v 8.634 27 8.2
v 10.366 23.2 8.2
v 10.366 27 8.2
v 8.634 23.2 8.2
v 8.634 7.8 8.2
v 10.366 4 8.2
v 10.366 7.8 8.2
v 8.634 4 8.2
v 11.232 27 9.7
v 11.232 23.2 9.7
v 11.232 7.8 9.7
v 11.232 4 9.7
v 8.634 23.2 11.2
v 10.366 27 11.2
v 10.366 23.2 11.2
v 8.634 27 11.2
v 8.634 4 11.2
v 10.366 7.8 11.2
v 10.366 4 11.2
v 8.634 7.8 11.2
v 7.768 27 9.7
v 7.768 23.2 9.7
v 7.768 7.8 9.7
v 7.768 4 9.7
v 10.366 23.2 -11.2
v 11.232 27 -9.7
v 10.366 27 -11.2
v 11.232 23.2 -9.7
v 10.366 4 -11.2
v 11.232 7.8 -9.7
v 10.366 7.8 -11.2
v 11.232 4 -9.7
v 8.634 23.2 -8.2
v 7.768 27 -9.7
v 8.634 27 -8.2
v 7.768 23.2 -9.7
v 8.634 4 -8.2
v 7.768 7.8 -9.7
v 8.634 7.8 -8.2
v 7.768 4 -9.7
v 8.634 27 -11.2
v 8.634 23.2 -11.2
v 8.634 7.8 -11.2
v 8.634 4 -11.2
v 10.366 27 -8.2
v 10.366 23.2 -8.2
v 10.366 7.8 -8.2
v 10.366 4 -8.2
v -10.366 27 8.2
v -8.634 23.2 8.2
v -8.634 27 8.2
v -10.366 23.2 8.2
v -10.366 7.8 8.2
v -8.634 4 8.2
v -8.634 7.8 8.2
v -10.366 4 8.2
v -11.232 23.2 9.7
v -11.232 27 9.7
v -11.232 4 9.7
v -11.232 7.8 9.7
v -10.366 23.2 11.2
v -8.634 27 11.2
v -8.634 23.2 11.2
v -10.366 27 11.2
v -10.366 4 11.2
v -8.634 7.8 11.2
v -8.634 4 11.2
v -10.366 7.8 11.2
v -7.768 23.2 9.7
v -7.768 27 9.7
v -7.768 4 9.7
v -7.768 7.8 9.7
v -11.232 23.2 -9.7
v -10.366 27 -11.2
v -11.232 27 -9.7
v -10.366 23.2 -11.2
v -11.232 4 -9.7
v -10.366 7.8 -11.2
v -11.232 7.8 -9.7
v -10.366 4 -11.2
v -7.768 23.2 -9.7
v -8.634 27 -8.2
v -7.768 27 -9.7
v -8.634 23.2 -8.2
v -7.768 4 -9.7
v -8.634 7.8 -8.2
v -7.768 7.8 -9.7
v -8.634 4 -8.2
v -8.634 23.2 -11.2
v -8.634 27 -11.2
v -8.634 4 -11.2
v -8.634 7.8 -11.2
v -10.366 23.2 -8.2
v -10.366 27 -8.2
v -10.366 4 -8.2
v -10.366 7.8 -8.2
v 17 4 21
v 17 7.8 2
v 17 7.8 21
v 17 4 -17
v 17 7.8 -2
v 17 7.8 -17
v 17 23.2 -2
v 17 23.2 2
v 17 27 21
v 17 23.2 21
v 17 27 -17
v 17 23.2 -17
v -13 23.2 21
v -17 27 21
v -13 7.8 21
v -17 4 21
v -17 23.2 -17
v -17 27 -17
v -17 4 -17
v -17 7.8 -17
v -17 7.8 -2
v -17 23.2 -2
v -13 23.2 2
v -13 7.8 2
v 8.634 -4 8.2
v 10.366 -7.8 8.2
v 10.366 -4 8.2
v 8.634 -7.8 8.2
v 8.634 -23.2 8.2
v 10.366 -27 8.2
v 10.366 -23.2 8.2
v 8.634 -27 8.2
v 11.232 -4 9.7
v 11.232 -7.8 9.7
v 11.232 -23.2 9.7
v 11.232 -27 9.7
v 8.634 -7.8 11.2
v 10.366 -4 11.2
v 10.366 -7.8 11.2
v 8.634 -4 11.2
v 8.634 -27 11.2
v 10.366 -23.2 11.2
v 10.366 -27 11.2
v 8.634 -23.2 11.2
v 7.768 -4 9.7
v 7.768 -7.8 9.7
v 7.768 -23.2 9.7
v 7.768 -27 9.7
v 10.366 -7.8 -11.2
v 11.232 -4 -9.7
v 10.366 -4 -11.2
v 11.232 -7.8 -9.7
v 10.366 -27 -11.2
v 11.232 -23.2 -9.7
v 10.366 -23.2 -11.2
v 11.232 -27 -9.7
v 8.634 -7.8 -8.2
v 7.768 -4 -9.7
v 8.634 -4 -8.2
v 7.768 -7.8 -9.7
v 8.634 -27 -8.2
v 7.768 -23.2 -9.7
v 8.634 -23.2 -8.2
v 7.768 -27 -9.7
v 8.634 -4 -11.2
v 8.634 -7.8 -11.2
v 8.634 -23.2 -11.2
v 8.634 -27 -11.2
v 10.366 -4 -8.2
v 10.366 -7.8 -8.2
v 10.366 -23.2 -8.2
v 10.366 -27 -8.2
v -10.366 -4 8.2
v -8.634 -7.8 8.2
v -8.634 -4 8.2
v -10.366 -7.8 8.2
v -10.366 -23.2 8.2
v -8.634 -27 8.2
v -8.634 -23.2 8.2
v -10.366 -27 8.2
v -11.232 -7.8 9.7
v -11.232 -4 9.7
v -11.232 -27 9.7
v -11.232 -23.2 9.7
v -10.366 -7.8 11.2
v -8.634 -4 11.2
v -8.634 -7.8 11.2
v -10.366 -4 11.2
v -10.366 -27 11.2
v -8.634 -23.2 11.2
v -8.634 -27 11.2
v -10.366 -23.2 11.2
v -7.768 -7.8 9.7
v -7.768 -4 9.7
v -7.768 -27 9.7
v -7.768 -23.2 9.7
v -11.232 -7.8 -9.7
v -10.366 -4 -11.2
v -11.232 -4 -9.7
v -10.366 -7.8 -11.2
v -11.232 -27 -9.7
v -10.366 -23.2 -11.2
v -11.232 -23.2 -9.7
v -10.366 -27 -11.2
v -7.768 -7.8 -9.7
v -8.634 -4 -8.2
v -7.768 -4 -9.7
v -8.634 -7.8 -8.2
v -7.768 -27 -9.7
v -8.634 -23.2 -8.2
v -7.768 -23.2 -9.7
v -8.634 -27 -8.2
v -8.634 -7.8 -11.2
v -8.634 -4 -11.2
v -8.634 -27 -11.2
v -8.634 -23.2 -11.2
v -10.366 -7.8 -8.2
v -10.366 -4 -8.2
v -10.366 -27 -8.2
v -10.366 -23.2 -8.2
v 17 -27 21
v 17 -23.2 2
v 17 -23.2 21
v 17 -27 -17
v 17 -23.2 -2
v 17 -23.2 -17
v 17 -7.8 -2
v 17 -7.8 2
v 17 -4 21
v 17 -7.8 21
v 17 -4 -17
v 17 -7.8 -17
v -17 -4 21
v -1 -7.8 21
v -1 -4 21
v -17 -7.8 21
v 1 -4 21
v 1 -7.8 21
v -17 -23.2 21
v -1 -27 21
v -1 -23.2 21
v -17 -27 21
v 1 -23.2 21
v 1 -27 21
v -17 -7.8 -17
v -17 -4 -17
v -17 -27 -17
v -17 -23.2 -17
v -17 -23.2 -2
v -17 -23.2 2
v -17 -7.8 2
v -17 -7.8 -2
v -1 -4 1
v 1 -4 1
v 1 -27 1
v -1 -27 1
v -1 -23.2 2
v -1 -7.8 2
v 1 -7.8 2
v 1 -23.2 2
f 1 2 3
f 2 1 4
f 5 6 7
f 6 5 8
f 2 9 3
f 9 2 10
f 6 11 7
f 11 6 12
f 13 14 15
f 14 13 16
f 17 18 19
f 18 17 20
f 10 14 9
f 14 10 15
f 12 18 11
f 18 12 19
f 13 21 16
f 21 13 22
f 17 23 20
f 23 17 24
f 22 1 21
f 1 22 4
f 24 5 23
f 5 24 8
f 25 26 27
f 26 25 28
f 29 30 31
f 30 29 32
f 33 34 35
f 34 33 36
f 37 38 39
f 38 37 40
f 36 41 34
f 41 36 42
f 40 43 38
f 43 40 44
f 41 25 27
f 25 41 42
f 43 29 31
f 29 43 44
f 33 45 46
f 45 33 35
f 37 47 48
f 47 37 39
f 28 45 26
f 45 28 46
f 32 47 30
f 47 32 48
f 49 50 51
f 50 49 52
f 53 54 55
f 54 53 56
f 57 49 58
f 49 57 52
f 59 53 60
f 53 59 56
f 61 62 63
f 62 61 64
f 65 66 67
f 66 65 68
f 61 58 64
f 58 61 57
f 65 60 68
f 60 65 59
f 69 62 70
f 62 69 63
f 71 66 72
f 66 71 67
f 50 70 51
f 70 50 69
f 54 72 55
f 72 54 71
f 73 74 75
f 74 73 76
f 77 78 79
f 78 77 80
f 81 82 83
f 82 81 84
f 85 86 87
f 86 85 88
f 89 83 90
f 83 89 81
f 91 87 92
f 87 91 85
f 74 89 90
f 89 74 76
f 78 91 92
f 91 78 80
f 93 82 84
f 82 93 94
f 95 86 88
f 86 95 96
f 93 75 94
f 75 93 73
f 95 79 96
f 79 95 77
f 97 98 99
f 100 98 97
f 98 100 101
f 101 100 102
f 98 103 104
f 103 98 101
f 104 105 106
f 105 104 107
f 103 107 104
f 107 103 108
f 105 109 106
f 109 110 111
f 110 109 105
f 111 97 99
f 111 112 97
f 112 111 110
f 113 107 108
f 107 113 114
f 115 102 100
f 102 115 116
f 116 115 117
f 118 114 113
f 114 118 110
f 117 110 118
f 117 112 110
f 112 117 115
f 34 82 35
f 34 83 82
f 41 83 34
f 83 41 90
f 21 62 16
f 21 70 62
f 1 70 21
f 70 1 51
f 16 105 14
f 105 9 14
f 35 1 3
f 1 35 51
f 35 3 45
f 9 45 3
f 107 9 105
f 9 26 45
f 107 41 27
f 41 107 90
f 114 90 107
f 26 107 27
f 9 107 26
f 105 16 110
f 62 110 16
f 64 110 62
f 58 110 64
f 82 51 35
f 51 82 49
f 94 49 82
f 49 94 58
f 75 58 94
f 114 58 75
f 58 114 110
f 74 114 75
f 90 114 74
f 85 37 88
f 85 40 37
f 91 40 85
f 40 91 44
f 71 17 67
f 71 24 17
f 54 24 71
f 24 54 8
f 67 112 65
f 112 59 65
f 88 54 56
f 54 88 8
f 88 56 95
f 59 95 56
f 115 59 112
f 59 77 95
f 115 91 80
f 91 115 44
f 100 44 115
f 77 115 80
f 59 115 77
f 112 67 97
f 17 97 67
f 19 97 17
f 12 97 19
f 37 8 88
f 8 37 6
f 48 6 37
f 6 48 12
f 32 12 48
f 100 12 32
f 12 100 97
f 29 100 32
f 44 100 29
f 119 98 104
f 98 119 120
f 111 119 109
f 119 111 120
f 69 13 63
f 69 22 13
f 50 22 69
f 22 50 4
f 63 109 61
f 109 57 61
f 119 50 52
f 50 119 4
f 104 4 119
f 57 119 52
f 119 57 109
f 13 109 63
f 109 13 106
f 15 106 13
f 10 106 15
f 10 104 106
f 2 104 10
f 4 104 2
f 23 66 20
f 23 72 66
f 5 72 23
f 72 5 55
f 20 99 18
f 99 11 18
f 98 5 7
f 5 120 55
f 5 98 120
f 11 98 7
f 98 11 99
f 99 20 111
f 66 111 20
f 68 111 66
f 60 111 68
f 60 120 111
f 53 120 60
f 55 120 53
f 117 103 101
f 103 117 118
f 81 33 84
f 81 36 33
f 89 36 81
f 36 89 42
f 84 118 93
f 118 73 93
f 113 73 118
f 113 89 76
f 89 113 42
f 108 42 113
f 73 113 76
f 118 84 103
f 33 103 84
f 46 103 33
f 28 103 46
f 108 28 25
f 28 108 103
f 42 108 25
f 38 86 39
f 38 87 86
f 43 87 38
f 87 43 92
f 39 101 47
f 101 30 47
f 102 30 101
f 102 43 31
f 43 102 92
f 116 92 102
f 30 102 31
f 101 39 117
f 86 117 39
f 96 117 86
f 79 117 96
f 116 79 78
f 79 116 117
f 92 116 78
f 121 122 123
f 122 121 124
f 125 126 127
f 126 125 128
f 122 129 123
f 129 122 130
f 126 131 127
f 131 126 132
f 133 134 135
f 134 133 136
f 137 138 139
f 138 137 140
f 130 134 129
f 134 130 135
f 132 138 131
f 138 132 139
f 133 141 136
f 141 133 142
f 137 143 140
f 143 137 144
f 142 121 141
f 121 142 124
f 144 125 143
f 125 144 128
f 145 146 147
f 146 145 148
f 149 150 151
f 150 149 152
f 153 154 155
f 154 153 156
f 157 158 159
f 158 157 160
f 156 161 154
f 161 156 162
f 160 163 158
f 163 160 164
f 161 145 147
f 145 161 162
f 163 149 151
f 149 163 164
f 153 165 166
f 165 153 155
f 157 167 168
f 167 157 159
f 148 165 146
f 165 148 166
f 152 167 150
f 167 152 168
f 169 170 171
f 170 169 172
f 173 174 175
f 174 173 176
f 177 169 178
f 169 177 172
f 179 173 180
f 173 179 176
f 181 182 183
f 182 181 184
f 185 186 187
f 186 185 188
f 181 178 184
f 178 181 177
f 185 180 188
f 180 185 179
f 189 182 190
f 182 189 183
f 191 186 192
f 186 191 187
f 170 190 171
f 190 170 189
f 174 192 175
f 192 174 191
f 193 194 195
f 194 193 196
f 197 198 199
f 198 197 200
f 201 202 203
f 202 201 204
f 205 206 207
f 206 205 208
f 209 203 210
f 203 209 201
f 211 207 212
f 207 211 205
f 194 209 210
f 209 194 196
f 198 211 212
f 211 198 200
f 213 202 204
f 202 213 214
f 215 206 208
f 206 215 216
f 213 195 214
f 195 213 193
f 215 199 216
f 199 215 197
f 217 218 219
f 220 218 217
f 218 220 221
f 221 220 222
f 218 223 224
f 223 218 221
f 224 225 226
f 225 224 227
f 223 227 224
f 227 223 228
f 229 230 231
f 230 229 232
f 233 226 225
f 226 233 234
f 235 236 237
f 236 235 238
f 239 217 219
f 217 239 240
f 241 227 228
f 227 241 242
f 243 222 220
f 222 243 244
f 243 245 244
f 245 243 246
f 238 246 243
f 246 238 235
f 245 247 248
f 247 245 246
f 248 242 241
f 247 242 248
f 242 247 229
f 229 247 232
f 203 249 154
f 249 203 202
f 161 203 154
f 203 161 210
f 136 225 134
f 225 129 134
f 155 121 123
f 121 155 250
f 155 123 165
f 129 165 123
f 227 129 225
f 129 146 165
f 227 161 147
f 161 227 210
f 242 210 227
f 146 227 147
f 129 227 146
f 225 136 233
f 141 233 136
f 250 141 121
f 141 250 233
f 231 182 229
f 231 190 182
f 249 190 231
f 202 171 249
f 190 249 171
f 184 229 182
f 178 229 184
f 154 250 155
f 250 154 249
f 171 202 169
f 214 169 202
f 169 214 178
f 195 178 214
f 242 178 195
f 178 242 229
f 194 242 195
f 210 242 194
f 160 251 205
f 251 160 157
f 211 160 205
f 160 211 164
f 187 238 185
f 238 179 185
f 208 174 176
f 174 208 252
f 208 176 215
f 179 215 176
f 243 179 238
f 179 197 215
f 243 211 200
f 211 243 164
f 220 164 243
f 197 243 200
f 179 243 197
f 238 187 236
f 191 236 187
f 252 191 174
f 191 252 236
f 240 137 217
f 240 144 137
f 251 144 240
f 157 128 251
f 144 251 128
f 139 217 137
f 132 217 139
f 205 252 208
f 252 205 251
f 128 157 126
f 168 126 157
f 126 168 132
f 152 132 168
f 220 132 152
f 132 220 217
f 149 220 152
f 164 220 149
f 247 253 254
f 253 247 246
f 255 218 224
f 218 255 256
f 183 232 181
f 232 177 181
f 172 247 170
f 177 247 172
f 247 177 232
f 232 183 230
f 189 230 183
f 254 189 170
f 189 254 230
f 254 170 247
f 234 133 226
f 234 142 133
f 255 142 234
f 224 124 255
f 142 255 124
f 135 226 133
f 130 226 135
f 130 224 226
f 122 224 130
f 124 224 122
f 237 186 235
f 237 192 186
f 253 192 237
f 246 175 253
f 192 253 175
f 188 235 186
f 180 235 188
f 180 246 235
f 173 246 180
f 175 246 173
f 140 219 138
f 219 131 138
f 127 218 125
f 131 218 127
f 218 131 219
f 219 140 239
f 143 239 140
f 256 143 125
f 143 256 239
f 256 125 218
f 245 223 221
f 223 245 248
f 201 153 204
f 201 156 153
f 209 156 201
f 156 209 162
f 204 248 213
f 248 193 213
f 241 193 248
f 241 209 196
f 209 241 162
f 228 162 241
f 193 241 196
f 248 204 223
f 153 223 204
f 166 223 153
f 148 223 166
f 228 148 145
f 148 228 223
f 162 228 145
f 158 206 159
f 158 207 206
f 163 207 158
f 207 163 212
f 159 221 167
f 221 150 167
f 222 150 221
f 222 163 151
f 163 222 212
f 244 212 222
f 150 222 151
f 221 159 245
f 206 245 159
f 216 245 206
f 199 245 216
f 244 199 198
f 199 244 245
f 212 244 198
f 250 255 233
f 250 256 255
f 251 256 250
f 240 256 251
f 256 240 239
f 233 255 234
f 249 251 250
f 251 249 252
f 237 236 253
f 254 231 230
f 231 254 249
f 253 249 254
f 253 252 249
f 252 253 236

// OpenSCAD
// Extrusion width, 15mm for OpenBeam.
EW=15;

// How sturdy do you want it?
WALL=4;

// Extra space on the inside.
tol=0.2;

// Which part to show
part = "both"; // [end, jig, both]


module PART(name) {
  if (part == "both") {
    render() children();
  } else if (part == name) {
    children();
  }
}

// nopheads polyhole
module polyhole(h, d, N = 0) {
  n = (N == 0) ? max(round(2 * d),3) : N;
  cylinder(h = h, r = (d / 2) / cos (180 / n), $fn = n, center=true);
}

module x_mirror() {
  children();
  mirror([1,0,0]) children();
}
module z_mirror() {
  children();
  mirror([0,0,1]) children();
}

module basic_shape(end) {
  difference() {
    translate([0,0,WALL/2]) cube([EW*2+WALL, EW+2*WALL, EW*2+WALL*2], center=true);
    translate([end?WALL*1.5:0,0,EW+WALL/2]) cube([EW*2+WALL*2, EW+tol*2, EW*2], center=true);
    translate([0,0,-EW-WALL/2]) cube([EW*3, EW+tol*2, EW*2], center=true);
    x_mirror() z_mirror() 
    translate([(EW+WALL)/2,0,(EW+WALL)/2+tol]) rotate([90,0,0]) polyhole(EW*2, 3);

    if (!end) translate([0,0,EW+WALL/2-1]) cube([2, EW*2, EW*2], center=true);
  }
}

PART("end") translate([0,  EW/2 + WALL*2, 0]) basic_shape(true);
PART("jig") translate([0, -EW/2 - WALL*2,0]) basic_shape(false);
